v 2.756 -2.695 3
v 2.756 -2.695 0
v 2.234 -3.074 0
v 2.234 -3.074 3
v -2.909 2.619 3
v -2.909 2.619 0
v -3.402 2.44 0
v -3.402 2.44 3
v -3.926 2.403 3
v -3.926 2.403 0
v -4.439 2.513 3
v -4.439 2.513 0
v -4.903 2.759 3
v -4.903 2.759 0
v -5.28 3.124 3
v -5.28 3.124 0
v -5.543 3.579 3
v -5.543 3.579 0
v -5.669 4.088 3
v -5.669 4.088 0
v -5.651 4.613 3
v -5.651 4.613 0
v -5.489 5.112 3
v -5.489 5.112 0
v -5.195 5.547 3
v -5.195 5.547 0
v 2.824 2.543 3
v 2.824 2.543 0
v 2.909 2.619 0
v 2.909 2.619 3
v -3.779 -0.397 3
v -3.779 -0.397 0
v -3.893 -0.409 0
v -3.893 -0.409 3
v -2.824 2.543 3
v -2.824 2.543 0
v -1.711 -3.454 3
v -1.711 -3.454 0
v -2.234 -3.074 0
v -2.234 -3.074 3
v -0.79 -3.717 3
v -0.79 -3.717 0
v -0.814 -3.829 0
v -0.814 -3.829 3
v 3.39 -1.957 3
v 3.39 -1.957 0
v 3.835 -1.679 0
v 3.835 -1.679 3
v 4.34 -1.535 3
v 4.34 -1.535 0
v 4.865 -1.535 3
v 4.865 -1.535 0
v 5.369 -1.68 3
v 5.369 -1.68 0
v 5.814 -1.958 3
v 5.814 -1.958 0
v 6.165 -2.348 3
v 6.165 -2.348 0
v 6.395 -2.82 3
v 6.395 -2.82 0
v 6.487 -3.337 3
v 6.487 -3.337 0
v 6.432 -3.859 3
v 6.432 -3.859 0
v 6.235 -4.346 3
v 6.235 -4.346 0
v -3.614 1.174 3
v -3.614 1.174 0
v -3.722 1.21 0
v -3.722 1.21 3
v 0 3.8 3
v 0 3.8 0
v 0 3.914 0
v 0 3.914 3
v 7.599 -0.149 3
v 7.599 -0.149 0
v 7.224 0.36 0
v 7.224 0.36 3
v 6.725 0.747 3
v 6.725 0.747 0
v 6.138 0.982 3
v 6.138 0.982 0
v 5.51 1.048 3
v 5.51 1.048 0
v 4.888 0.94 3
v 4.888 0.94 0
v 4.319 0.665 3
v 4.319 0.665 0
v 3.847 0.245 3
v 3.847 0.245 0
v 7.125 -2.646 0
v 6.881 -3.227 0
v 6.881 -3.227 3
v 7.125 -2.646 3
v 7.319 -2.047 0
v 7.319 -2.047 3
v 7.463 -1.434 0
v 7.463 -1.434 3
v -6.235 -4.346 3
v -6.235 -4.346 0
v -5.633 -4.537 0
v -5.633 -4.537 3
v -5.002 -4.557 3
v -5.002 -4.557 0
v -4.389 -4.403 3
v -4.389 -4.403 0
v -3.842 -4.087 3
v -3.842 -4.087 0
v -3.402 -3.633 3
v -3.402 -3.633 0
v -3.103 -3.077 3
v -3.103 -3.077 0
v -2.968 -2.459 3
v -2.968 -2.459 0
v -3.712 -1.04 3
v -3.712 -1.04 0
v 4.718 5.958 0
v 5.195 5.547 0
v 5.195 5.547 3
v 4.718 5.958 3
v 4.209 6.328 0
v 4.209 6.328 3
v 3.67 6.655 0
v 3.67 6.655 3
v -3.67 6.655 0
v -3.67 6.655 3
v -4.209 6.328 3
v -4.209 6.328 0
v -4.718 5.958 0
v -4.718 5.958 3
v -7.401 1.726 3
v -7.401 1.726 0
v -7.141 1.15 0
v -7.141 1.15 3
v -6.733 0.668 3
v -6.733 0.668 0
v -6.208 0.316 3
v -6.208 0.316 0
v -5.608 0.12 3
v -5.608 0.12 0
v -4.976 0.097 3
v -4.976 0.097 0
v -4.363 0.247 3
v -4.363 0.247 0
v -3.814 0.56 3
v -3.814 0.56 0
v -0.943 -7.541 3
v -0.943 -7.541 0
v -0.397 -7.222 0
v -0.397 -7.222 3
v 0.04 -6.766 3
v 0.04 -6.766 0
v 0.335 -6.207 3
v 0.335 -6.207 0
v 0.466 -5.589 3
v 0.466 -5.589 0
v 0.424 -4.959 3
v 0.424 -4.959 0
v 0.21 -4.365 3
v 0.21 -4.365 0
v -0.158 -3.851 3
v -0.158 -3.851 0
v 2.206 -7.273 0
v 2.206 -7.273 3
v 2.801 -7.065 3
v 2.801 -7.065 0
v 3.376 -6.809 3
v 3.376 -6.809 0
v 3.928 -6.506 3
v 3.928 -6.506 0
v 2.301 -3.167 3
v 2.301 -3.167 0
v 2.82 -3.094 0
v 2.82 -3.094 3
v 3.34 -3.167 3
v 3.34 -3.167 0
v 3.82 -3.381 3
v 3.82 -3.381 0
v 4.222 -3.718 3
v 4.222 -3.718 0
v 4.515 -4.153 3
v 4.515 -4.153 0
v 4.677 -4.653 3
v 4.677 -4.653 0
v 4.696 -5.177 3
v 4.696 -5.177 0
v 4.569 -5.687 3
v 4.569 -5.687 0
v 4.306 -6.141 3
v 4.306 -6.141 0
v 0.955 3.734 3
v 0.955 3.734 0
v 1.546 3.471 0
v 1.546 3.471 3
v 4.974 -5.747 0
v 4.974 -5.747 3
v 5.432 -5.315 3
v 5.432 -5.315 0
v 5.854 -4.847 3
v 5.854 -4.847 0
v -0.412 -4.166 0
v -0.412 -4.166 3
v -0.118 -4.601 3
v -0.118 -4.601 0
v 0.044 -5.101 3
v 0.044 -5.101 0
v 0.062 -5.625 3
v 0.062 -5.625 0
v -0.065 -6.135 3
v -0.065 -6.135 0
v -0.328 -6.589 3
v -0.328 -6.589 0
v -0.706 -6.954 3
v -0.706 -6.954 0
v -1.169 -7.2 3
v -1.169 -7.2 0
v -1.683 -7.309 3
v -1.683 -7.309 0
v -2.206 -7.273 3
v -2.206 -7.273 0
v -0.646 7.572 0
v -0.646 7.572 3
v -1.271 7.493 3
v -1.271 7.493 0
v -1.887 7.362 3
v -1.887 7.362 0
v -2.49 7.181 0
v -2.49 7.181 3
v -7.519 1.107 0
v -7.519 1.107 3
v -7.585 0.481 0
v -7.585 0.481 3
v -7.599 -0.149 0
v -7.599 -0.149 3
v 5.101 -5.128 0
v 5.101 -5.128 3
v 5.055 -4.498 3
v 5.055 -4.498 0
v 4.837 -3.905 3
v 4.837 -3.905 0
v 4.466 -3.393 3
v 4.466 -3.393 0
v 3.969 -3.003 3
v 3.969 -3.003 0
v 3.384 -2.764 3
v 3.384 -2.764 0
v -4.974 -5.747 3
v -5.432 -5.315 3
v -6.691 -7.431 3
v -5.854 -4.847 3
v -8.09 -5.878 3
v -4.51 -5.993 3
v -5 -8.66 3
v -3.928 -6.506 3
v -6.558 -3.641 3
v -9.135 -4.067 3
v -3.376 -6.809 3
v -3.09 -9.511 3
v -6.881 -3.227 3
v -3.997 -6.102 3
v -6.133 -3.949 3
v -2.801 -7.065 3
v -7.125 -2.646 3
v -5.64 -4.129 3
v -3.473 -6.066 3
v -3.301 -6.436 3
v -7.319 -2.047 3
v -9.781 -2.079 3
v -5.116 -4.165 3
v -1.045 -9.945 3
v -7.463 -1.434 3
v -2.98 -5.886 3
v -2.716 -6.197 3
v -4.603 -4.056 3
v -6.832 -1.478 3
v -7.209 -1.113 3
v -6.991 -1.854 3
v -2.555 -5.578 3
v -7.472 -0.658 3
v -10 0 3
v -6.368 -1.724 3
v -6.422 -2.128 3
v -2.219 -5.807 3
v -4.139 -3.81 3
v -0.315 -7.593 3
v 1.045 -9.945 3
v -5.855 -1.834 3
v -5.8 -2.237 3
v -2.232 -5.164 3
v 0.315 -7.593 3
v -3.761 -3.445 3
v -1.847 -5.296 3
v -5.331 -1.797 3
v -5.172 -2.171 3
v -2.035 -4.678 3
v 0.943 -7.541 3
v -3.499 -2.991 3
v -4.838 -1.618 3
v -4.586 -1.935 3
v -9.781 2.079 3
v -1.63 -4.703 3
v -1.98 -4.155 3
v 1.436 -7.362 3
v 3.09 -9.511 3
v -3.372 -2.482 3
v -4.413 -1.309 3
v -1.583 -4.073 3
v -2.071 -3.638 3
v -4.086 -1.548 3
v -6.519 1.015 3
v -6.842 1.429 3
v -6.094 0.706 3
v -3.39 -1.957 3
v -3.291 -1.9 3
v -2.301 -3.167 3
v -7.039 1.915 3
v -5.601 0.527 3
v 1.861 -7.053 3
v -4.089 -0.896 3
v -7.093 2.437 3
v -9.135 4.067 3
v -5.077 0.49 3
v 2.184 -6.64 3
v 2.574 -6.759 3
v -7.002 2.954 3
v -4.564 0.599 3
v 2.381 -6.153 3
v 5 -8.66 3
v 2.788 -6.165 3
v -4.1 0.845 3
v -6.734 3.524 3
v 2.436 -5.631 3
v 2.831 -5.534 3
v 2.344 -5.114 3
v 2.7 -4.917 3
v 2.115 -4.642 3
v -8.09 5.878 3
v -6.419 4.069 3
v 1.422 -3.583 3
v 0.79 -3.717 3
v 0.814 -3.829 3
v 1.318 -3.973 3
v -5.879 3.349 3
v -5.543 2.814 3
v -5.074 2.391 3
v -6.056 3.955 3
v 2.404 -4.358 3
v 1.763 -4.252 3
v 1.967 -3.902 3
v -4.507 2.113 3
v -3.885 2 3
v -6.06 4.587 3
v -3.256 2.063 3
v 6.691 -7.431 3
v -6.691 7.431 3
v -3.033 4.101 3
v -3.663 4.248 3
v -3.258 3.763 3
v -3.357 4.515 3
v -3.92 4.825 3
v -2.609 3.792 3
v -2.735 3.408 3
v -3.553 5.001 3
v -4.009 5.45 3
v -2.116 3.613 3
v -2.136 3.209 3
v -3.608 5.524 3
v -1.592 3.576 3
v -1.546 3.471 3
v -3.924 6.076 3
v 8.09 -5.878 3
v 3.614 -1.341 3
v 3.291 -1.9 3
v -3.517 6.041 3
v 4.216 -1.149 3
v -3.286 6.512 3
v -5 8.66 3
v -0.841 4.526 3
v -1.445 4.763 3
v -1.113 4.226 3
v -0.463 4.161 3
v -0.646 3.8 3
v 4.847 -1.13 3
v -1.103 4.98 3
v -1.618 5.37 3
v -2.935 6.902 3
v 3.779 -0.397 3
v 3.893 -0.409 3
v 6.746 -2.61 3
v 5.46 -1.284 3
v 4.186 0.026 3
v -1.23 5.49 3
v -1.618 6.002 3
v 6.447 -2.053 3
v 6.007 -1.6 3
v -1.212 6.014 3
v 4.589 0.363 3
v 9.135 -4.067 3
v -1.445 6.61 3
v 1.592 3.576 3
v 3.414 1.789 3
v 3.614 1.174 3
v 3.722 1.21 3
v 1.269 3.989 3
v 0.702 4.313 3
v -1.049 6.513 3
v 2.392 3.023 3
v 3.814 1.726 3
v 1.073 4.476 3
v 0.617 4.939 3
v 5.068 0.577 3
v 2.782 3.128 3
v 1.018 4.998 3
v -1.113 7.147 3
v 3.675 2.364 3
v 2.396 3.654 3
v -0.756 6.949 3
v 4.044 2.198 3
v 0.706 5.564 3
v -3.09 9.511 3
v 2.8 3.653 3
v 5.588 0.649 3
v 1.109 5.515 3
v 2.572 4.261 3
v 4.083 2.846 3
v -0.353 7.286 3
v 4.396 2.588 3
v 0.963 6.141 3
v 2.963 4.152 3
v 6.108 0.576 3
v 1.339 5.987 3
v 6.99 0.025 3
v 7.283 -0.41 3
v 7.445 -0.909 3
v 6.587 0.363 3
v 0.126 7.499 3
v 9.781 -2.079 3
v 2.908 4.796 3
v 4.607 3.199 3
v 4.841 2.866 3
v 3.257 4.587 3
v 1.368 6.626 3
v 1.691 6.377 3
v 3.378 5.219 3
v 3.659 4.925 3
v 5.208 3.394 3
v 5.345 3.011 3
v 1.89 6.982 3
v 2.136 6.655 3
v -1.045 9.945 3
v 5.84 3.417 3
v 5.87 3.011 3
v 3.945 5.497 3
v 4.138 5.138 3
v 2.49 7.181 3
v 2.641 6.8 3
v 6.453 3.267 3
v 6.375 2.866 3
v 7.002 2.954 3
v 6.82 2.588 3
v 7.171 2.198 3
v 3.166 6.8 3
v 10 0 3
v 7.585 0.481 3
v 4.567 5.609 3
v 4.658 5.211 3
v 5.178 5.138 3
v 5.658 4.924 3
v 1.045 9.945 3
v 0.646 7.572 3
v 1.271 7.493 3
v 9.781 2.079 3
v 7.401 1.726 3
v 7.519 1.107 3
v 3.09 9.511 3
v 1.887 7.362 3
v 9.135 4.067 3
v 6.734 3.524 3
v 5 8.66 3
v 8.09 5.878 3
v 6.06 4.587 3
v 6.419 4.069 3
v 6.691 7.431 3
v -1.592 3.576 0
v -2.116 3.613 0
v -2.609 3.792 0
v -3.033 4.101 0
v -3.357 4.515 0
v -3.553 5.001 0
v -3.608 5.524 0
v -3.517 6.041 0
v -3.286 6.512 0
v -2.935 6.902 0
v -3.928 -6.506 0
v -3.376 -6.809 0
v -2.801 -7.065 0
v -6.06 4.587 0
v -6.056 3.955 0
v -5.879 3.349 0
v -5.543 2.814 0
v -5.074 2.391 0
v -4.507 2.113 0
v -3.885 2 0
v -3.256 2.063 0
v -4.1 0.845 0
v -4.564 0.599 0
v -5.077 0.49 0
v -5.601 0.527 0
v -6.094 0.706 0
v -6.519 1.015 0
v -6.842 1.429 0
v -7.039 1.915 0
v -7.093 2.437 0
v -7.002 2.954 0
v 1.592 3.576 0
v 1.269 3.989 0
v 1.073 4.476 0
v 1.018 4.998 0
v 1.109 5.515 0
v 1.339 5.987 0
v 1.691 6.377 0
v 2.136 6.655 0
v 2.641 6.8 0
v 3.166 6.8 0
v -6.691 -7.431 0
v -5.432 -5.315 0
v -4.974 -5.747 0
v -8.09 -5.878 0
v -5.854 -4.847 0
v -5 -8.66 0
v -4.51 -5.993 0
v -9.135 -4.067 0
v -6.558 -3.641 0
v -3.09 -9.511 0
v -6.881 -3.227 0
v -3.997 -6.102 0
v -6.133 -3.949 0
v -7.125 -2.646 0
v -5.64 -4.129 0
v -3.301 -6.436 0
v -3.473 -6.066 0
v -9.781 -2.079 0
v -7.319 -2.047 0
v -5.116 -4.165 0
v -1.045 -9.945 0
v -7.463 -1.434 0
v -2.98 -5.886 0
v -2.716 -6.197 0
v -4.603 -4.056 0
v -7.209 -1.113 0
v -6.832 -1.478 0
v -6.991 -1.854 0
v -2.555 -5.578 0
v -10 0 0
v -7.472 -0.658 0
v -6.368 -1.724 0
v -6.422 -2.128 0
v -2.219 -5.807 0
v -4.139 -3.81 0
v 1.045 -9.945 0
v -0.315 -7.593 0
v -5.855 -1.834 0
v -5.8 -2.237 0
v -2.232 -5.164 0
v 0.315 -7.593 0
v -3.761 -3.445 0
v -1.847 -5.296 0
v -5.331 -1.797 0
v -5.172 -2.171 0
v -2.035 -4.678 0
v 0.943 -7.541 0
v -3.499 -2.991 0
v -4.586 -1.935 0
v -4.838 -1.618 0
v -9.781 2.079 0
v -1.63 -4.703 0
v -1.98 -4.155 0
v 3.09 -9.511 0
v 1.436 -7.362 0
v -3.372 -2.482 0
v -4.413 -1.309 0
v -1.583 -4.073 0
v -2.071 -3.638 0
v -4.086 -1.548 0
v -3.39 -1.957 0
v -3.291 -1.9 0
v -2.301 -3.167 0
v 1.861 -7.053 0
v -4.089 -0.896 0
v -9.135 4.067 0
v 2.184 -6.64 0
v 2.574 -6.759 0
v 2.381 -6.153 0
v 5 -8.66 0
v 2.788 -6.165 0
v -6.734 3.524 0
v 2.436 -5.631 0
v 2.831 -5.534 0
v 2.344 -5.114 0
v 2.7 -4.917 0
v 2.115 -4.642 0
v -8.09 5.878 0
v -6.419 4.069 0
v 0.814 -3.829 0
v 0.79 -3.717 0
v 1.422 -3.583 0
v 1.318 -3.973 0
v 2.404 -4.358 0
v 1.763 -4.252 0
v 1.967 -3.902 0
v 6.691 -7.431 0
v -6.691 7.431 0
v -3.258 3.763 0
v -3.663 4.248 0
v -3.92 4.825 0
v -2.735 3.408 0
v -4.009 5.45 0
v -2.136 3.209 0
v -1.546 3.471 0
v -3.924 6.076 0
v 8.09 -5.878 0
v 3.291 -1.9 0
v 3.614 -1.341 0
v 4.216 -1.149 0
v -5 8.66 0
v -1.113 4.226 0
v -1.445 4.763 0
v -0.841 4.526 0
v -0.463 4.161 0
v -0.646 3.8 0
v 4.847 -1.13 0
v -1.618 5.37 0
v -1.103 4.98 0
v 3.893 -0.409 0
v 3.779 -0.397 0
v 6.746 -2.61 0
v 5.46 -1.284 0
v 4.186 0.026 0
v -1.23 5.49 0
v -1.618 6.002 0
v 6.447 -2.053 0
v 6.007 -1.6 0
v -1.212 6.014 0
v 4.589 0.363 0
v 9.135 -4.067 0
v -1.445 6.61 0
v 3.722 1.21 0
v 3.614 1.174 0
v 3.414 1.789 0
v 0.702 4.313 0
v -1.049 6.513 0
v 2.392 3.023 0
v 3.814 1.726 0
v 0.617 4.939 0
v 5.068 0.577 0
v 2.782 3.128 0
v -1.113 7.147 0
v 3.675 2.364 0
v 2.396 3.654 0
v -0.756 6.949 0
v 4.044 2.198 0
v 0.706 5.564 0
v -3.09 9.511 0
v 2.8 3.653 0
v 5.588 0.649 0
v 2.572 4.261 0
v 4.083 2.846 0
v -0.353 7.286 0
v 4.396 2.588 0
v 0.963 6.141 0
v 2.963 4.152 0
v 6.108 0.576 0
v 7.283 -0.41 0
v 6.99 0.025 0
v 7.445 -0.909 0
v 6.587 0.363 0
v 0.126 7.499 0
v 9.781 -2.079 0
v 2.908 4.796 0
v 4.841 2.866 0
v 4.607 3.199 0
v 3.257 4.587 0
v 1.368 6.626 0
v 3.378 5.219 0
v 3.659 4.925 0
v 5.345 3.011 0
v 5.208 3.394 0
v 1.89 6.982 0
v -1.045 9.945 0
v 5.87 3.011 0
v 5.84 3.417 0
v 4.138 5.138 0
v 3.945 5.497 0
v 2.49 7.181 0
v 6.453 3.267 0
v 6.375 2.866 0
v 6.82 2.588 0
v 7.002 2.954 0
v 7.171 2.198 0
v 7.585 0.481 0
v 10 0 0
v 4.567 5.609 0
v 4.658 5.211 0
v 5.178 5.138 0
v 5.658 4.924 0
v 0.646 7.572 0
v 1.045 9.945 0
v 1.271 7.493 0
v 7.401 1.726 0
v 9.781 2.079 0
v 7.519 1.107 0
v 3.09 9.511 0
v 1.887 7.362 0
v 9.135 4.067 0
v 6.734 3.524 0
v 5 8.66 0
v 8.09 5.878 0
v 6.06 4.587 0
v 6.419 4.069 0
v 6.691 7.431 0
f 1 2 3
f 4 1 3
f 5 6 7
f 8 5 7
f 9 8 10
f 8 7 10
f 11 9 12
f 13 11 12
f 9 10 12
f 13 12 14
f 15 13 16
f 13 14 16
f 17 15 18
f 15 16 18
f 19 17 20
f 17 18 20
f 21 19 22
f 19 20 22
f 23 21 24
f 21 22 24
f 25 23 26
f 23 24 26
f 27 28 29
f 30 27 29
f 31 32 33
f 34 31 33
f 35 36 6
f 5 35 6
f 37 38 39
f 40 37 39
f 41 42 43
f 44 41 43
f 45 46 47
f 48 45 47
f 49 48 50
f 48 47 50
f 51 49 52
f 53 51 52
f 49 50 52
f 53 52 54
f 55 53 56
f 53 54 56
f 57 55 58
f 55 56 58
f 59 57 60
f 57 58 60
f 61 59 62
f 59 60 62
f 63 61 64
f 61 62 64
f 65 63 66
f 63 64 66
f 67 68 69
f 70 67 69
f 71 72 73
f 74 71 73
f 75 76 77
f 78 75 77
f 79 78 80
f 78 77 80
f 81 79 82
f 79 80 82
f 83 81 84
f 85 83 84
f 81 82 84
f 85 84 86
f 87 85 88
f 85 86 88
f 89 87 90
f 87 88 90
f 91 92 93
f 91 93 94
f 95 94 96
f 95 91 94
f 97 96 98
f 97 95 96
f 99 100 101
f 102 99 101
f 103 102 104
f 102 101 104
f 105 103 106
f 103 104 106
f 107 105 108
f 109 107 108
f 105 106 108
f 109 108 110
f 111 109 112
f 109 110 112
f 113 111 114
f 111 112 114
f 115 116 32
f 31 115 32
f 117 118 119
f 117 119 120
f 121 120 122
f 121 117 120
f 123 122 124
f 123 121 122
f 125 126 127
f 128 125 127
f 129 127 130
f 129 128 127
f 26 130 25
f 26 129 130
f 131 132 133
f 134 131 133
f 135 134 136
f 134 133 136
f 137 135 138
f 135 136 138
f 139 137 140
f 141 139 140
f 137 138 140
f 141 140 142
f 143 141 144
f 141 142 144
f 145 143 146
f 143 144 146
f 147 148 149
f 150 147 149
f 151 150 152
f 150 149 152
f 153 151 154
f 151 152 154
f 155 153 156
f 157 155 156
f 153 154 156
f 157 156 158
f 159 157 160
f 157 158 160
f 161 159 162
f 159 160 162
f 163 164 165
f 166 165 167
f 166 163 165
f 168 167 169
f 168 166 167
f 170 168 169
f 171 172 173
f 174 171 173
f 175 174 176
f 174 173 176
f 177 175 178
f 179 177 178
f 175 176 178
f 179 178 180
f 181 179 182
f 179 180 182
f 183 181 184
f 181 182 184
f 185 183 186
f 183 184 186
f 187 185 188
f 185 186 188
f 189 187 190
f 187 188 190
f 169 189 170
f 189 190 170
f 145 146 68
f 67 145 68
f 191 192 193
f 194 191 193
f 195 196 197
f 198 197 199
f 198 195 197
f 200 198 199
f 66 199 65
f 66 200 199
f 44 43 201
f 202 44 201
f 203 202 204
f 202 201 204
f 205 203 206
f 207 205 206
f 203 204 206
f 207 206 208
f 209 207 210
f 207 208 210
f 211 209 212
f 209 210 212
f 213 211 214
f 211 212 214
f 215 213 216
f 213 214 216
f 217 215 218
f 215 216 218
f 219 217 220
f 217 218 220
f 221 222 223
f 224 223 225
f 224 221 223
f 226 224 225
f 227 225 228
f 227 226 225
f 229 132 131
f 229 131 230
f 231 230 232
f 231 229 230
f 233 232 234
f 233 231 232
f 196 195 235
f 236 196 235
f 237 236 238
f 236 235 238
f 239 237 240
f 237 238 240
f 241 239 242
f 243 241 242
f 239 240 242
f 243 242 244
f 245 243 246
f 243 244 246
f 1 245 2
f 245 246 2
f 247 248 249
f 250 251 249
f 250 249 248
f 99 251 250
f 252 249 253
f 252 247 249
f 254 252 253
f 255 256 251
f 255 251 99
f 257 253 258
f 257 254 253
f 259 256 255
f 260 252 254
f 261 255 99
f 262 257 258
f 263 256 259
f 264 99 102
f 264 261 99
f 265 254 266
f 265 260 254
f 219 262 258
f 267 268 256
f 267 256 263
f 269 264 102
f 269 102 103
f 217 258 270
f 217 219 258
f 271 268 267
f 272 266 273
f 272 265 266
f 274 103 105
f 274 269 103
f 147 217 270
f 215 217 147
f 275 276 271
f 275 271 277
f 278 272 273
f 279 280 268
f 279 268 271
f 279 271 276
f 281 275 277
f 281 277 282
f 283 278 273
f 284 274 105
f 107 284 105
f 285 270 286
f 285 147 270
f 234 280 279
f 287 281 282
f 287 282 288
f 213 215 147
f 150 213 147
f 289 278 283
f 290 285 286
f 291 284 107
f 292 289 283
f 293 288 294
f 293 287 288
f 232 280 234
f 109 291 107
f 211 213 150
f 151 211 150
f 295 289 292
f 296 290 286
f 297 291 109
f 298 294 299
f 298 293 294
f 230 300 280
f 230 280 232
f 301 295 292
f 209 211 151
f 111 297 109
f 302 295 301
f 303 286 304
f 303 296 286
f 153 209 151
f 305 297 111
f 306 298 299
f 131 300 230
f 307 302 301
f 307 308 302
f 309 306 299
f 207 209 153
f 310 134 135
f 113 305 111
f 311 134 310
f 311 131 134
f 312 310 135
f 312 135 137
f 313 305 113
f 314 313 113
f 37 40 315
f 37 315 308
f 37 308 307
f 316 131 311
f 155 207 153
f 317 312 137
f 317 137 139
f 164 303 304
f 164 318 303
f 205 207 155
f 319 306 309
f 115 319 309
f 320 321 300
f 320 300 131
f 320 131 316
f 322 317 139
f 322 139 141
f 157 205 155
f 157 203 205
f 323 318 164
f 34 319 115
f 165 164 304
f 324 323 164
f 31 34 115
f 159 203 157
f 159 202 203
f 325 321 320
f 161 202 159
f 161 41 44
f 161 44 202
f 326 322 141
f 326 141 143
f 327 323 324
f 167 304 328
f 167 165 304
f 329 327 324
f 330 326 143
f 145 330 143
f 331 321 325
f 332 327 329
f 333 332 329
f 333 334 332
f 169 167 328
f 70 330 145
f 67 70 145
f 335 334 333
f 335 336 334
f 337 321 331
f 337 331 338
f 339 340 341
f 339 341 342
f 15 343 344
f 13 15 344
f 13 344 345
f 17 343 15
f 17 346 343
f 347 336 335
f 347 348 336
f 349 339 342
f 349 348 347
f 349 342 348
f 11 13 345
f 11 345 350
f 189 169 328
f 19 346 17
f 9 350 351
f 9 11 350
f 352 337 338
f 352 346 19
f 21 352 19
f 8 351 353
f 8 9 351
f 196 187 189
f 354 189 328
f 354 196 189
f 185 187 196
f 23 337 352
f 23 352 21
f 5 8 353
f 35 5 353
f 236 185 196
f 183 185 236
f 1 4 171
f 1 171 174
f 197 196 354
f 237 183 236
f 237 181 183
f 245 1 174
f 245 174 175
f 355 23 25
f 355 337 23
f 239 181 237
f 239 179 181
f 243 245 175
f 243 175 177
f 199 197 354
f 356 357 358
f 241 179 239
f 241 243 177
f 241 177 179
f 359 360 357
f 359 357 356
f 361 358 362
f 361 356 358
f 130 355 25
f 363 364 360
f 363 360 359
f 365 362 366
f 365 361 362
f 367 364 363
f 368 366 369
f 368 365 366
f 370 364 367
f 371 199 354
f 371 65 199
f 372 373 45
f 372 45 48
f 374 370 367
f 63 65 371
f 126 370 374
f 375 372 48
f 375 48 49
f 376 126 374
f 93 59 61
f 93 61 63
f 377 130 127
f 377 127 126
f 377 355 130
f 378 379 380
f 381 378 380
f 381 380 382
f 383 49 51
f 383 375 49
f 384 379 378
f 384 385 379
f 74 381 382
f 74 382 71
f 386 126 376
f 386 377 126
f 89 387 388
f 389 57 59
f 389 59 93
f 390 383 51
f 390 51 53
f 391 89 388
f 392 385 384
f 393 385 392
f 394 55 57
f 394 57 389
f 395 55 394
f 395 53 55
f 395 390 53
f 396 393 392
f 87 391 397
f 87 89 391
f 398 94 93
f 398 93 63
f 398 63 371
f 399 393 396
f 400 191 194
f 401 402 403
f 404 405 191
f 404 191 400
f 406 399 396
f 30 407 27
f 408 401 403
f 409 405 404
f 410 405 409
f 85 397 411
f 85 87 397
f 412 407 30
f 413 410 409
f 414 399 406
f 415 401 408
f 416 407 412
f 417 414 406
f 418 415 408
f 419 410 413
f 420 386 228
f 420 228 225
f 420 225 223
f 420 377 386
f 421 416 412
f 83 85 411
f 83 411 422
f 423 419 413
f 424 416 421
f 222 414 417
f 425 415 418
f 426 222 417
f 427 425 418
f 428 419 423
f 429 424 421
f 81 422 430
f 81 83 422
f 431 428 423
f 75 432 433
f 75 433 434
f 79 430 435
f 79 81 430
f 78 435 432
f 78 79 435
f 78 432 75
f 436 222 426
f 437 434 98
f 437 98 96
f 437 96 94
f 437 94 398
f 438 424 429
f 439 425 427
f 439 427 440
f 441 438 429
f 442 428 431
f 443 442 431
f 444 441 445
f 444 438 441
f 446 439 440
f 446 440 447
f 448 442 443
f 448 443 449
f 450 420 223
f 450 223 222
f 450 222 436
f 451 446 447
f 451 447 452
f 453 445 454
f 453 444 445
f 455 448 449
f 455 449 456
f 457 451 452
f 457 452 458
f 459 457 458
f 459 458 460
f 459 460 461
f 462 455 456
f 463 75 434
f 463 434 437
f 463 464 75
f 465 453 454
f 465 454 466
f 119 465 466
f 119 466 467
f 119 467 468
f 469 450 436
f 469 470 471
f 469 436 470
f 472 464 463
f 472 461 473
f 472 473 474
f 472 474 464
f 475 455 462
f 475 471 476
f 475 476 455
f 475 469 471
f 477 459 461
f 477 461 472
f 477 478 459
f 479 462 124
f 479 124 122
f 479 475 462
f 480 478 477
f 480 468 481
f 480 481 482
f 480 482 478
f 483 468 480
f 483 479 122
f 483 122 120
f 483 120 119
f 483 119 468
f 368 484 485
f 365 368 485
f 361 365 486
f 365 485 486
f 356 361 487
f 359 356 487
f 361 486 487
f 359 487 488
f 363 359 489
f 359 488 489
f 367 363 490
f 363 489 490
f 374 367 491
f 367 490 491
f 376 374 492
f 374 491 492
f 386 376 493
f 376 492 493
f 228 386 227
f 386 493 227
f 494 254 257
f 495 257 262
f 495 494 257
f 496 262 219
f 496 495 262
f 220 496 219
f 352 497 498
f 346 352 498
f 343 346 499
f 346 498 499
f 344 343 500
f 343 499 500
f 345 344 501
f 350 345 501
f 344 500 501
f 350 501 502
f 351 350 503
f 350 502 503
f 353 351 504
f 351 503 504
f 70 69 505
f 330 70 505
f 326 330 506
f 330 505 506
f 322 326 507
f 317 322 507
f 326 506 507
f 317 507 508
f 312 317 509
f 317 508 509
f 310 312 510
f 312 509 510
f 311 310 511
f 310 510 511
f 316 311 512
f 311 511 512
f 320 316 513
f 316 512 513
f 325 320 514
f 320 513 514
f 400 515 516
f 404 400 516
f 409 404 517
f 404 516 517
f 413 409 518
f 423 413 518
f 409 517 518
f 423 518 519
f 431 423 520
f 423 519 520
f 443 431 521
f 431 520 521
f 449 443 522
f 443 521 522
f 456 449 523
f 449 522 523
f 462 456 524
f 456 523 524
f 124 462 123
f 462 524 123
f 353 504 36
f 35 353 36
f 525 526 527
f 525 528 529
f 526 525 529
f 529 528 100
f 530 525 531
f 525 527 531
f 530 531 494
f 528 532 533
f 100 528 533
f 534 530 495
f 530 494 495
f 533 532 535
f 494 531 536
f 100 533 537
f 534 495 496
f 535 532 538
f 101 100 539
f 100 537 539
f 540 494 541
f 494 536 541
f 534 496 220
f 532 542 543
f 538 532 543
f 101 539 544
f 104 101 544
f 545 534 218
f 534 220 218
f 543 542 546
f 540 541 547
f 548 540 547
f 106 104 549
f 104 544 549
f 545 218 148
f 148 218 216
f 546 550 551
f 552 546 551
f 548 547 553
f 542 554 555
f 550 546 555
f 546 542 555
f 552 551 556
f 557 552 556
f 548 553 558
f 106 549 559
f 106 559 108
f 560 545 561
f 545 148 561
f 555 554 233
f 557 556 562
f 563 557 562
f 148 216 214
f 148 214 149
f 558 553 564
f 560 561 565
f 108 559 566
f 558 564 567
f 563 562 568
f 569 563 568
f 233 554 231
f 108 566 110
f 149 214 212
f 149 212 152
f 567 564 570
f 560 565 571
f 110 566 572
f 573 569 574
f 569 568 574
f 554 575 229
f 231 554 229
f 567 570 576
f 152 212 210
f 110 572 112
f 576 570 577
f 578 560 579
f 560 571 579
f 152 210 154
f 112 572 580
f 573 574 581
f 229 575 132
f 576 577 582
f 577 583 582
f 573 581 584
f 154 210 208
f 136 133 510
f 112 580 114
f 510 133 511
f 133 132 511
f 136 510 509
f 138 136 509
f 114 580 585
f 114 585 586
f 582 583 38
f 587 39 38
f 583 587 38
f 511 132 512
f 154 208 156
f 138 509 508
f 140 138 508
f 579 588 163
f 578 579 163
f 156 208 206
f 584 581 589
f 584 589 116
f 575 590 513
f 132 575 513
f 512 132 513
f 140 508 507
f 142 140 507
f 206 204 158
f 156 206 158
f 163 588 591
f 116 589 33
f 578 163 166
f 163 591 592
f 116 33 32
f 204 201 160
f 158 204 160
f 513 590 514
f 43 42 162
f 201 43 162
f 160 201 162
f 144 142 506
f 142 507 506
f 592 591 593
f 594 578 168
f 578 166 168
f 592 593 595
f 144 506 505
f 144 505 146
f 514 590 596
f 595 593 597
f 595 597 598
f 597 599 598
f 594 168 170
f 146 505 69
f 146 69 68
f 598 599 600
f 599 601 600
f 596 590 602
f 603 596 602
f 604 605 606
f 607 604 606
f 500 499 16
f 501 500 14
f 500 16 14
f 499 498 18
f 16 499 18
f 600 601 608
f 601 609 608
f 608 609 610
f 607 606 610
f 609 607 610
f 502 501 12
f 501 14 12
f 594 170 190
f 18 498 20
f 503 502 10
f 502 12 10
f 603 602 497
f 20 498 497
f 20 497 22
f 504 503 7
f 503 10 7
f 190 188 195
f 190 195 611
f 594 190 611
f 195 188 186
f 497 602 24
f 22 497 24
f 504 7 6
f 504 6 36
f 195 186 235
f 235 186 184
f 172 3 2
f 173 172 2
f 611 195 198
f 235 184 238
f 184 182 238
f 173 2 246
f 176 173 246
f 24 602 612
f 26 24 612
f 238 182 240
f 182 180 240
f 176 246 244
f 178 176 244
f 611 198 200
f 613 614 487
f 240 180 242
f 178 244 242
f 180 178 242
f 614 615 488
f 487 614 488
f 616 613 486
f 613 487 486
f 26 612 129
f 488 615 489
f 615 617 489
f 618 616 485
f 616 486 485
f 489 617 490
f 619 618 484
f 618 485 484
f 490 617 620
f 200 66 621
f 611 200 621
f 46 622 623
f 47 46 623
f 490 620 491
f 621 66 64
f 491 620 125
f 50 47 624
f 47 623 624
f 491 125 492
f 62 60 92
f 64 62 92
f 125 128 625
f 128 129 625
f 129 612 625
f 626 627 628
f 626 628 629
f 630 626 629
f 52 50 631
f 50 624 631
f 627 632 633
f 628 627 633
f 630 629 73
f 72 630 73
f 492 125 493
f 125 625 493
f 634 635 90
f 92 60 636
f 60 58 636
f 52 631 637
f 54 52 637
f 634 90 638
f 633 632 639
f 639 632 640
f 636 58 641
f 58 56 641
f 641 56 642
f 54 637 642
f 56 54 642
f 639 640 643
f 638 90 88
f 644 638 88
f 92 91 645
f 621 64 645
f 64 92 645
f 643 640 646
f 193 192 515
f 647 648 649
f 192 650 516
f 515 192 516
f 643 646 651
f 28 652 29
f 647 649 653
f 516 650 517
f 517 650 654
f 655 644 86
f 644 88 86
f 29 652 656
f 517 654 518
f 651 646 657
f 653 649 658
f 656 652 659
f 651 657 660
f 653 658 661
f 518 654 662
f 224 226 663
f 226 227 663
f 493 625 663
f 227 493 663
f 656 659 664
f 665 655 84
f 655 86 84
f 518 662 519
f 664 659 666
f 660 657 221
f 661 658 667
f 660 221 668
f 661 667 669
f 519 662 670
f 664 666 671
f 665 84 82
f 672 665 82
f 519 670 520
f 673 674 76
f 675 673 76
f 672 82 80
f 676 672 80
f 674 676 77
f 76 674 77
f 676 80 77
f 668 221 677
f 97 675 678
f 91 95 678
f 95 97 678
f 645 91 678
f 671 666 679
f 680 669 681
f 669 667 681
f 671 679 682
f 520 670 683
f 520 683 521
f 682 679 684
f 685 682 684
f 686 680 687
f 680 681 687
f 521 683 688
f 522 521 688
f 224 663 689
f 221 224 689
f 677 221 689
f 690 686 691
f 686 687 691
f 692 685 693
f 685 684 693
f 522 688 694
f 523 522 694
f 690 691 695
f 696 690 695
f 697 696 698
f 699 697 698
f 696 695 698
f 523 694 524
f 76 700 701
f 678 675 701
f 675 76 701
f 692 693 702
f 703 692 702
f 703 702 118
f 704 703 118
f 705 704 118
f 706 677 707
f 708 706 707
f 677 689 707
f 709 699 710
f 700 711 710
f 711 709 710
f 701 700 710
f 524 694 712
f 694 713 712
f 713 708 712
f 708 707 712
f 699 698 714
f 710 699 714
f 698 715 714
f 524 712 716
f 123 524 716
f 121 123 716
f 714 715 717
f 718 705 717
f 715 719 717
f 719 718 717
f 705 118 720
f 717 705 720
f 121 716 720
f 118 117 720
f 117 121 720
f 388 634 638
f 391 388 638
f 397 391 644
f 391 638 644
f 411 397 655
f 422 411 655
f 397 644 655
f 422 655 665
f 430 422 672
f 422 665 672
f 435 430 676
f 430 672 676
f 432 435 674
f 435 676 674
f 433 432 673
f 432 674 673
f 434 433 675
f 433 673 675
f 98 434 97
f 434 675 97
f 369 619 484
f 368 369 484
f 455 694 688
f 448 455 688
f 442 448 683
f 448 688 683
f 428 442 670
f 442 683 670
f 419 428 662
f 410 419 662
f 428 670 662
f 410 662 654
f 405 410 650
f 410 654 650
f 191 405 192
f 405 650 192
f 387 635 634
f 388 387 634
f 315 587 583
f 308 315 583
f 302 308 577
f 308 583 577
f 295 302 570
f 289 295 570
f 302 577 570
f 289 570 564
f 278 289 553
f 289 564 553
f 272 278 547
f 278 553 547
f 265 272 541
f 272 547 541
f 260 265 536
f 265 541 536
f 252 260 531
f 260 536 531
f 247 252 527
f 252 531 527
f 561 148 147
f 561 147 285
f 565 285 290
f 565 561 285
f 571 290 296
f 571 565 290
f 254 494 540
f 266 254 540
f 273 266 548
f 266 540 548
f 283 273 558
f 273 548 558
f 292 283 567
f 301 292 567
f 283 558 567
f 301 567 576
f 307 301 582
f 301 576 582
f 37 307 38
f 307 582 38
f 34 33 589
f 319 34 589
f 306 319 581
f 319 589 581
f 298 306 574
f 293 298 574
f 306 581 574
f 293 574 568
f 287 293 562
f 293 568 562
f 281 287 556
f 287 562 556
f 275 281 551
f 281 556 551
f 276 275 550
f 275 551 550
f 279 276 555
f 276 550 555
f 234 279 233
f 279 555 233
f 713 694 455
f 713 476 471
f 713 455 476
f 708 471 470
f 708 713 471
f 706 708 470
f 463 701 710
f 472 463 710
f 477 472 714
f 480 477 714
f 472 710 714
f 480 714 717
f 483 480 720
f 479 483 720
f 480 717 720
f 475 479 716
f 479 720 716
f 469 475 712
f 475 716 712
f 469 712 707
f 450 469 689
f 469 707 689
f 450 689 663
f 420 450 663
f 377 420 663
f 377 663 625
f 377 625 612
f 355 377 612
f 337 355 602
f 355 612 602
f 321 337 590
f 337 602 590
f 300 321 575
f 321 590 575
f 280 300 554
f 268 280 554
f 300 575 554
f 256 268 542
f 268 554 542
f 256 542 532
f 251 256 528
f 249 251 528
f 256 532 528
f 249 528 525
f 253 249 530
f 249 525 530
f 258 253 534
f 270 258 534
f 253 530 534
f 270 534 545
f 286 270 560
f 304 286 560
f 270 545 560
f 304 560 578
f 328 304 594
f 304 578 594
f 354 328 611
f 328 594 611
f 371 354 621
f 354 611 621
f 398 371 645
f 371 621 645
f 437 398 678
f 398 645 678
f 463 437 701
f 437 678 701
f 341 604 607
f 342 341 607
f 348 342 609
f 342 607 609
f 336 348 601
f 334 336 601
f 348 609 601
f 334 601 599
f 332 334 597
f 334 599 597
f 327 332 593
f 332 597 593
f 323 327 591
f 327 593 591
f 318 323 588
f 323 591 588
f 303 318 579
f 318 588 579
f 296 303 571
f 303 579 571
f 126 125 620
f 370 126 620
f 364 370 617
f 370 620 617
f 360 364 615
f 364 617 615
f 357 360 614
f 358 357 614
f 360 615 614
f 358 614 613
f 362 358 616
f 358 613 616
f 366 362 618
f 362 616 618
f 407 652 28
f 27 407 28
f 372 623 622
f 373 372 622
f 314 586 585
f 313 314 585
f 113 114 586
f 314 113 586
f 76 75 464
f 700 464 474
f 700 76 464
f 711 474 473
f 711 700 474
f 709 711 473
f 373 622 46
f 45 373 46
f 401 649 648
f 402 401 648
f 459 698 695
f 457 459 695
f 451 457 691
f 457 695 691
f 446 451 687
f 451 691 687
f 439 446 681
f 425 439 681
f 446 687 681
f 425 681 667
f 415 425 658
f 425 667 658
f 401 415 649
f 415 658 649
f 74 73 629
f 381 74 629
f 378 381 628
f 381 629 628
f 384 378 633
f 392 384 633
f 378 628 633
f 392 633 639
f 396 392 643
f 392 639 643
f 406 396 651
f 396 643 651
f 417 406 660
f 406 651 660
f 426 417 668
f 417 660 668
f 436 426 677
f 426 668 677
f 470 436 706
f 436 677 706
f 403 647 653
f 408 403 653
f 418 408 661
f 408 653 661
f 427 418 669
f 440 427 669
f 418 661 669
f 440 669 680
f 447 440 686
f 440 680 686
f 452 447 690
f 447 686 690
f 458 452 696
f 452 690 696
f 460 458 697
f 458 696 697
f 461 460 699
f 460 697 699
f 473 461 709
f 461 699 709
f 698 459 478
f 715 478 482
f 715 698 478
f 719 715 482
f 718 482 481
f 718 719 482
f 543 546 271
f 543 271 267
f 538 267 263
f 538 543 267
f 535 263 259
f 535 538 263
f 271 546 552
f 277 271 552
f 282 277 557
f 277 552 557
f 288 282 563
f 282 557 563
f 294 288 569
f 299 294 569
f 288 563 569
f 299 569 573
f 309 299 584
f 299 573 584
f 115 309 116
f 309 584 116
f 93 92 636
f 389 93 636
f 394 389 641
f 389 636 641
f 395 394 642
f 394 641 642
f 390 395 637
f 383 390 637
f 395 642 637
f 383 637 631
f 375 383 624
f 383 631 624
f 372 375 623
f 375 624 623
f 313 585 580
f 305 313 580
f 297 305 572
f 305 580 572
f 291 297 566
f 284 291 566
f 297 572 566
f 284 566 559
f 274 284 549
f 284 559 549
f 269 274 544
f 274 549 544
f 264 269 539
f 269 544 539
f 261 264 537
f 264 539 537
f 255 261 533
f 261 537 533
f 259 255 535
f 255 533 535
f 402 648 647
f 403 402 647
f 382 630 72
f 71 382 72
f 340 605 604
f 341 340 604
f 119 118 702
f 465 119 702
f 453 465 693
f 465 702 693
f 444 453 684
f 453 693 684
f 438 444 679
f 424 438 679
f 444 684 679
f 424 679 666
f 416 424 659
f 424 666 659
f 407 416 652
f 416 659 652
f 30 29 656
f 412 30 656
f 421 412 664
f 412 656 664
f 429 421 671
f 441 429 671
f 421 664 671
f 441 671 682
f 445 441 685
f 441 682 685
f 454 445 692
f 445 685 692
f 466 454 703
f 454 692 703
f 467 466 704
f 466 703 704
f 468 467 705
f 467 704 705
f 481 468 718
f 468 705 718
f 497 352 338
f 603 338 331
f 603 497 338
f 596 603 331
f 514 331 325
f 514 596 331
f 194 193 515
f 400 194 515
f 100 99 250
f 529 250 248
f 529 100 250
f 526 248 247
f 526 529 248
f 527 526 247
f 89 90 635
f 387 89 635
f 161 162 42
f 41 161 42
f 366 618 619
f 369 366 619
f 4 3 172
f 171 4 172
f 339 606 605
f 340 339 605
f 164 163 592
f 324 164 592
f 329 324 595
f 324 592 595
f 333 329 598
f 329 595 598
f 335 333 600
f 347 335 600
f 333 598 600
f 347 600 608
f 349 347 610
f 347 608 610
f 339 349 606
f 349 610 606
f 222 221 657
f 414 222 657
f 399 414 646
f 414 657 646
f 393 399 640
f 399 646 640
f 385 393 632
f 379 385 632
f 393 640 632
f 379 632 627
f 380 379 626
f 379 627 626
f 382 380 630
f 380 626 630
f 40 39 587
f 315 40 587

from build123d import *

# Parameters (mm, degrees)
F0_R            = 10
F0_R_2          = 7.6
F1_DEPTH        = 3
F3_DEPTH        = 3
F3_COPIES_COUNT = 15


# Not quite as in the source:
# - a pattern or mirror of a feature is missing from the dataset's text; its kind, count and spacing are read off the source's solid
# - a feature names something its author has since deleted; it is built from what else it names


with BuildPart() as f1:
    # F0 (on Top) → F1 (new body)
    with BuildSketch(Plane.XY):
        Circle(F0_R)
        Circle(F0_R_2, mode=Mode.SUBTRACT)
    extrude(amount=F1_DEPTH)

    # F2 (on Top) → F3 (join, through all)
    with BuildSketch(Plane.XY):
        with BuildLine():
            ThreePointArc((0, 3.9140510674), (-1.211569324, 6.0142199175), (0.6459488827, 7.57249959))
            ThreePointArc((0.6459488827, 7.57249959), (0, 7.6), (-0.6459488827, 7.57249959))
            ThreePointArc((-0.6459488827, 7.57249959), (-1.6403009124, 5.686249795), (-0.6459488827, 3.8))
            Line((-0.6459488827, 3.8), (0, 3.8))
            Line((0, 3.8), (0, 3.9140510674))
        make_face()
    f3 = extrude(amount=F3_DEPTH)

    # F3_copies: F3 ×15 about axis
    f3_copies_axis = Axis((0, 0, 0), (0, 0, 1))
    for i in range(1, F3_COPIES_COUNT):
        add(f3.rotate(f3_copies_axis, i * 360 / F3_COPIES_COUNT))


solid = f1.part
